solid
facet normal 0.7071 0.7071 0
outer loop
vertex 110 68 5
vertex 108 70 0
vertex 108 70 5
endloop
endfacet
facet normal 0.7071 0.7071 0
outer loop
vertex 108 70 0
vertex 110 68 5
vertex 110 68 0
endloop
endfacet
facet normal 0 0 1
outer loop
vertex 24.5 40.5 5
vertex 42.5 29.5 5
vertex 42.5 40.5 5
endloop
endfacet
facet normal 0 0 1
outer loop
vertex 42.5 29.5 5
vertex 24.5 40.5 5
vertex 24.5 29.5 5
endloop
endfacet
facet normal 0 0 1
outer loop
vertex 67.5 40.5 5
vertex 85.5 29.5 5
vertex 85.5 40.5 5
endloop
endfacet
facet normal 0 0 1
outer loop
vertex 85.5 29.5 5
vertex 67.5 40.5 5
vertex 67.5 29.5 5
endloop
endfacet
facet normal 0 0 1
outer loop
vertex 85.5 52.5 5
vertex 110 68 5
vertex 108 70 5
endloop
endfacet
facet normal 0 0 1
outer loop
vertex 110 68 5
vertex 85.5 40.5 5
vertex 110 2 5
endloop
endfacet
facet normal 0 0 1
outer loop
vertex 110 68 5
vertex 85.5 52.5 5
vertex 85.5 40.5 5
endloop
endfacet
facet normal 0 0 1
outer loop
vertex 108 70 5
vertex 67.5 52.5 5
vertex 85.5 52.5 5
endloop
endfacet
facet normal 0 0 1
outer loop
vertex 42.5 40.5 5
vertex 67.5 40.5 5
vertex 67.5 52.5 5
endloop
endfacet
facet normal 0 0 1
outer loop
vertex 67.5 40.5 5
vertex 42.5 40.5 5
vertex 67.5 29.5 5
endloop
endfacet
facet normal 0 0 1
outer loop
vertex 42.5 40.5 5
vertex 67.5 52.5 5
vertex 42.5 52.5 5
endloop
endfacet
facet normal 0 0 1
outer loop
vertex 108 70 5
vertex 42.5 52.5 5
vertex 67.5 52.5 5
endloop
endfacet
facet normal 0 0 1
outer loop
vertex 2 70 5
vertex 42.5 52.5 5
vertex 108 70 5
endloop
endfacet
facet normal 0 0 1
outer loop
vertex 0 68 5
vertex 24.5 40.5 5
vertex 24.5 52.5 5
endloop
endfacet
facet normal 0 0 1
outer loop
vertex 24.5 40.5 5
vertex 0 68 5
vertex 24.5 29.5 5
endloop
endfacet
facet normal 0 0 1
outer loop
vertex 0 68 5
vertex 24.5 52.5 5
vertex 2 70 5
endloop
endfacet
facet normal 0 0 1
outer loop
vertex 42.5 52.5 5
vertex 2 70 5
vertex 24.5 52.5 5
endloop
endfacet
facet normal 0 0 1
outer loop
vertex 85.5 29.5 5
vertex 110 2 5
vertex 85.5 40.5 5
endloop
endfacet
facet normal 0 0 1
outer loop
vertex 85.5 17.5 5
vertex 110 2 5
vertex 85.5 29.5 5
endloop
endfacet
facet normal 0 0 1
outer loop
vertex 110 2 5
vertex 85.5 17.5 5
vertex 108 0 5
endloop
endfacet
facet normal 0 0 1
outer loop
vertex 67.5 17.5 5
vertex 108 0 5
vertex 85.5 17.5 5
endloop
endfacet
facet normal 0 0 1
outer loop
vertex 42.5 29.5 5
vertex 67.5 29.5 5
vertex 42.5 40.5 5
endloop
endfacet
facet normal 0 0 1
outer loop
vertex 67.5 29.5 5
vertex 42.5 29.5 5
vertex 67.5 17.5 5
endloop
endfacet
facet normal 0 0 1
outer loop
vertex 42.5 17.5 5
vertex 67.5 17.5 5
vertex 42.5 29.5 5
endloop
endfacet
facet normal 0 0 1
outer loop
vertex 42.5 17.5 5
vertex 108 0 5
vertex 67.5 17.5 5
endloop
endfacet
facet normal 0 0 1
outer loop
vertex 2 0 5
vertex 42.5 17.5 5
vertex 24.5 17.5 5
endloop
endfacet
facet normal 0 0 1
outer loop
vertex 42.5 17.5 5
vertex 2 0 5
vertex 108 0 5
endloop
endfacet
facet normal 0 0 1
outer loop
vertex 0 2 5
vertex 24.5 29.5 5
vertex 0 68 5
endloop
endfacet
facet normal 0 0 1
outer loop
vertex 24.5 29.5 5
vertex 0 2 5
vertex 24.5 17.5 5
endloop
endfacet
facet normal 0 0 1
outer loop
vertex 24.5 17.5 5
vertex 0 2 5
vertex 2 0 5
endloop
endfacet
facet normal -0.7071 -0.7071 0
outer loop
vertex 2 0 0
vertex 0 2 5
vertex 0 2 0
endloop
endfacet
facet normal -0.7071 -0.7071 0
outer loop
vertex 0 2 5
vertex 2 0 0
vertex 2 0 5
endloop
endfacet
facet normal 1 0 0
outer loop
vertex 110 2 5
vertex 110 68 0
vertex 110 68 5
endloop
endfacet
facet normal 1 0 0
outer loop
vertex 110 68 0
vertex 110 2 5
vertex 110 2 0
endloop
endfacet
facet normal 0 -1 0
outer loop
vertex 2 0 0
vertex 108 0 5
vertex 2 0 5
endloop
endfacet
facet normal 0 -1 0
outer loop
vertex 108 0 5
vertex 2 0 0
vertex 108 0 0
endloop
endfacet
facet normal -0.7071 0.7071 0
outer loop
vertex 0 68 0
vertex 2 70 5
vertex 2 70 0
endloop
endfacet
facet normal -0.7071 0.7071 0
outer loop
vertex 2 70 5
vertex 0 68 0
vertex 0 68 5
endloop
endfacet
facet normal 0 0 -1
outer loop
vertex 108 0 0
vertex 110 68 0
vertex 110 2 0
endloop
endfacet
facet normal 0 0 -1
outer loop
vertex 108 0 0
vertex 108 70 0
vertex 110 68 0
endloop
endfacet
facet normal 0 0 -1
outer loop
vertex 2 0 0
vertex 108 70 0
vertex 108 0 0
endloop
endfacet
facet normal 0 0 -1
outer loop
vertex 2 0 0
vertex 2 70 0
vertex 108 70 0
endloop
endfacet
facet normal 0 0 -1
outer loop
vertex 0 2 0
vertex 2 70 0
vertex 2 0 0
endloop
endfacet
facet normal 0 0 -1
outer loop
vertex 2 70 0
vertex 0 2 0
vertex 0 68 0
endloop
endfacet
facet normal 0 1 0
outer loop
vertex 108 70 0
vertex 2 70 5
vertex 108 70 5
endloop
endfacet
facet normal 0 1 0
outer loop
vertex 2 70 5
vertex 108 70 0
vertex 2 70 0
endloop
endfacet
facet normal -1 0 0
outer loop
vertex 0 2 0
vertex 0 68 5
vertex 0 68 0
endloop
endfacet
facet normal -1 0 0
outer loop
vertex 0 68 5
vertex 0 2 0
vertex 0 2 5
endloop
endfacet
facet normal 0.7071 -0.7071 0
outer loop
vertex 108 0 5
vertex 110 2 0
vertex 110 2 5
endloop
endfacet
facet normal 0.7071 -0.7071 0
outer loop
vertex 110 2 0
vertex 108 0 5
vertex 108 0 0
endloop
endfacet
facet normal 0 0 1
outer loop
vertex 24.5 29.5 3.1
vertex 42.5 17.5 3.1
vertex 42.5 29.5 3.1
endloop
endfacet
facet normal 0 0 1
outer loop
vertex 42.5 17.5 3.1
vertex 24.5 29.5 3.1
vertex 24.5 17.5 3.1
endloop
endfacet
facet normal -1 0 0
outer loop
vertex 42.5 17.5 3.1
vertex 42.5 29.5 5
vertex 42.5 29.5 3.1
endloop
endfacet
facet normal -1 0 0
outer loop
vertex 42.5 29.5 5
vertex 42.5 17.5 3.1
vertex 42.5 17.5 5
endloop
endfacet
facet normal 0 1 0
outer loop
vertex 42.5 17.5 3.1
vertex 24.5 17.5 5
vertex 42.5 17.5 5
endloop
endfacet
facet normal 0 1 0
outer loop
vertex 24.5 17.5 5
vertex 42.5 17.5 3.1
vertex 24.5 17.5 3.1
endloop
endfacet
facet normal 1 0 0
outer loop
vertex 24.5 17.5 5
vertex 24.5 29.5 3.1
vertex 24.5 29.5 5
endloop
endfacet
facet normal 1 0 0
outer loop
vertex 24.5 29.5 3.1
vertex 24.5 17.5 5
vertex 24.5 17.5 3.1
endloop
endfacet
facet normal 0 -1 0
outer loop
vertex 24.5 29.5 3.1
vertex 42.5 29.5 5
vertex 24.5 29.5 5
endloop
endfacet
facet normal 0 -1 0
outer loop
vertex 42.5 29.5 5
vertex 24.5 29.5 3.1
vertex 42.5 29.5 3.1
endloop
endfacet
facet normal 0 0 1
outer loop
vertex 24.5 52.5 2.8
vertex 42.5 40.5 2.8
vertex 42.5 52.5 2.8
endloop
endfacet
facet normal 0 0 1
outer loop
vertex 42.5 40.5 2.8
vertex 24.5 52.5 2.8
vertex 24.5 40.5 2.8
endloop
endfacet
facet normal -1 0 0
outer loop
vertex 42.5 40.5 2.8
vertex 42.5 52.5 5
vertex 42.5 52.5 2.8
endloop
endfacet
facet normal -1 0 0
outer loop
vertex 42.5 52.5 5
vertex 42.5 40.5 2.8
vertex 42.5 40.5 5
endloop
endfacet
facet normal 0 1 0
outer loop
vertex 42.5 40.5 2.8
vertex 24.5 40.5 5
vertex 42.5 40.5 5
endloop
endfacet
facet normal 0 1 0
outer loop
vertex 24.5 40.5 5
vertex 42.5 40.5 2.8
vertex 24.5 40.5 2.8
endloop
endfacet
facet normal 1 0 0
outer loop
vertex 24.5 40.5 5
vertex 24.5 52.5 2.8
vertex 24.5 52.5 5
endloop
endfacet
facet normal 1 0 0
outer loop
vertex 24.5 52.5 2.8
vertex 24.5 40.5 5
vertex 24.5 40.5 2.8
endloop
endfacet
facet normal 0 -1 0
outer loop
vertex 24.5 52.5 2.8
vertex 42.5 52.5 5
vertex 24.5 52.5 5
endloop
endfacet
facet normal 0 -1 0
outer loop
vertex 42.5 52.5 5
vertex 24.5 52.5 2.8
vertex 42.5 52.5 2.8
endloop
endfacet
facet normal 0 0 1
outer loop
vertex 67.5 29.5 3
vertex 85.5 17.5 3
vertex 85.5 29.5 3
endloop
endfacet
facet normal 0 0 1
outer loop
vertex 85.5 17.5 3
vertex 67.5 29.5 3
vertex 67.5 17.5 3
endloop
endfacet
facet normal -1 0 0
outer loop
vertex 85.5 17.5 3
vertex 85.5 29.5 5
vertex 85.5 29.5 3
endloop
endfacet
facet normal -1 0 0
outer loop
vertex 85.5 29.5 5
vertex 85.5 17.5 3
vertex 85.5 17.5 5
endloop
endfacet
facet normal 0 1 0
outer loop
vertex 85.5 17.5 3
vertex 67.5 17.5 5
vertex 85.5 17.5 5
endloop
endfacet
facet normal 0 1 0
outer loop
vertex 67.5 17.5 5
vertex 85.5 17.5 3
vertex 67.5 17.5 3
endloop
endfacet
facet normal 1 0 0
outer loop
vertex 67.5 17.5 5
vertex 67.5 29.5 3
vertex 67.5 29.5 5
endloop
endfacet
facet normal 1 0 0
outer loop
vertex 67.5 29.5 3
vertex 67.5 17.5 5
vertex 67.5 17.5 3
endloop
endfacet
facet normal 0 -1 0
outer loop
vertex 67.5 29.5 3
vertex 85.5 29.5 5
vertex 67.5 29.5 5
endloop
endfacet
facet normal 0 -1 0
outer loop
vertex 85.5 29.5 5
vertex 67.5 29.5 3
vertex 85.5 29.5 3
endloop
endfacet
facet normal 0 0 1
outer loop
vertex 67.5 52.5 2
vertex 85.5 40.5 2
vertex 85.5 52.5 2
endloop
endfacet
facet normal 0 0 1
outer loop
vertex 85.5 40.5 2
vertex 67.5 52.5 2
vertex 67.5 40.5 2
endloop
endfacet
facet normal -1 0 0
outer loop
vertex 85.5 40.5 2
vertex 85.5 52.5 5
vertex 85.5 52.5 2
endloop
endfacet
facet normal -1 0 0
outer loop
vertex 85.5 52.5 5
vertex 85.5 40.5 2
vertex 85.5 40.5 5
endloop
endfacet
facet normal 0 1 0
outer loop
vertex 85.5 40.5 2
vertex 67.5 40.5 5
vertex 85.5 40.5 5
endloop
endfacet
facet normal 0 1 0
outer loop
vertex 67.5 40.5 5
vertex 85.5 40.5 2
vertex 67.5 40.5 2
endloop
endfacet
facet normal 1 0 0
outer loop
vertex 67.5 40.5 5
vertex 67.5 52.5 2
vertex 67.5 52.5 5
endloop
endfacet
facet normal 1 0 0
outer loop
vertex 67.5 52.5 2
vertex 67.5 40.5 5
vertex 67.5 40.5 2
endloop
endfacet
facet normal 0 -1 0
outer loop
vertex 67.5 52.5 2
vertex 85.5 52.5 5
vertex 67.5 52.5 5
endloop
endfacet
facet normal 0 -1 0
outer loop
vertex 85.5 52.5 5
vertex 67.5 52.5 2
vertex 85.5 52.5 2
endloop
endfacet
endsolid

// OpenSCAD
$fn = 32;

// ----------------------------------------------------------------------
// Windowed plate: 4 voids, 110 x 70 x 5 mm
// ----------------------------------------------------------------------

// --- parameters (mm) ---
plate_l = 110;            // plate length, X
plate_w = 70;             // plate width, Y
plate_t = 5;              // plate thickness, Z
edge_margin = 12;         // wall from the plate edge to any window
win_l = 18;               // pocket length
win_w = 12;               // pocket width
pitch_x = 43;             // grid pitch along X
pitch_y = 23;             // grid pitch along Y
depth_1 = 1.9;            // depth of void 1 (full thickness = through)
depth_2 = 2.2;            // depth of void 2 (full thickness = through)
depth_3 = 2;              // depth of void 3 (full thickness = through)
depth_4 = 3;              // depth of void 4 (full thickness = through)
corner_c = 2;             // corner chamfer of the plate

profile = [[2, 0], [108, 0], [110, 2], [110, 68], [108, 70], [2, 70], [0, 68], [0, 2]];  // primary outline, 8 points, counter clockwise
void_1 = [[24.5, 17.5], [42.5, 17.5], [42.5, 29.5], [24.5, 29.5]];  // pocket at grid node 0,0, 4 points
void_2 = [[24.5, 40.5], [42.5, 40.5], [42.5, 52.5], [24.5, 52.5]];  // pocket at grid node 0,1, 4 points
void_3 = [[67.5, 17.5], [85.5, 17.5], [85.5, 29.5], [67.5, 29.5]];  // pocket at grid node 1,0, 4 points
void_4 = [[67.5, 40.5], [85.5, 40.5], [85.5, 52.5], [67.5, 52.5]];  // pocket at grid node 1,1, 4 points

// --- the one profile operation ---
difference() {
  linear_extrude(height = plate_t) polygon(points = profile);
  translate([0, 0, plate_t - depth_1])
    linear_extrude(height = depth_1 + 1) polygon(points = void_1);
  translate([0, 0, plate_t - depth_2])
    linear_extrude(height = depth_2 + 1) polygon(points = void_2);
  translate([0, 0, plate_t - depth_3])
    linear_extrude(height = depth_3 + 1) polygon(points = void_3);
  translate([0, 0, plate_t - depth_4])
    linear_extrude(height = depth_4 + 1) polygon(points = void_4);
}
